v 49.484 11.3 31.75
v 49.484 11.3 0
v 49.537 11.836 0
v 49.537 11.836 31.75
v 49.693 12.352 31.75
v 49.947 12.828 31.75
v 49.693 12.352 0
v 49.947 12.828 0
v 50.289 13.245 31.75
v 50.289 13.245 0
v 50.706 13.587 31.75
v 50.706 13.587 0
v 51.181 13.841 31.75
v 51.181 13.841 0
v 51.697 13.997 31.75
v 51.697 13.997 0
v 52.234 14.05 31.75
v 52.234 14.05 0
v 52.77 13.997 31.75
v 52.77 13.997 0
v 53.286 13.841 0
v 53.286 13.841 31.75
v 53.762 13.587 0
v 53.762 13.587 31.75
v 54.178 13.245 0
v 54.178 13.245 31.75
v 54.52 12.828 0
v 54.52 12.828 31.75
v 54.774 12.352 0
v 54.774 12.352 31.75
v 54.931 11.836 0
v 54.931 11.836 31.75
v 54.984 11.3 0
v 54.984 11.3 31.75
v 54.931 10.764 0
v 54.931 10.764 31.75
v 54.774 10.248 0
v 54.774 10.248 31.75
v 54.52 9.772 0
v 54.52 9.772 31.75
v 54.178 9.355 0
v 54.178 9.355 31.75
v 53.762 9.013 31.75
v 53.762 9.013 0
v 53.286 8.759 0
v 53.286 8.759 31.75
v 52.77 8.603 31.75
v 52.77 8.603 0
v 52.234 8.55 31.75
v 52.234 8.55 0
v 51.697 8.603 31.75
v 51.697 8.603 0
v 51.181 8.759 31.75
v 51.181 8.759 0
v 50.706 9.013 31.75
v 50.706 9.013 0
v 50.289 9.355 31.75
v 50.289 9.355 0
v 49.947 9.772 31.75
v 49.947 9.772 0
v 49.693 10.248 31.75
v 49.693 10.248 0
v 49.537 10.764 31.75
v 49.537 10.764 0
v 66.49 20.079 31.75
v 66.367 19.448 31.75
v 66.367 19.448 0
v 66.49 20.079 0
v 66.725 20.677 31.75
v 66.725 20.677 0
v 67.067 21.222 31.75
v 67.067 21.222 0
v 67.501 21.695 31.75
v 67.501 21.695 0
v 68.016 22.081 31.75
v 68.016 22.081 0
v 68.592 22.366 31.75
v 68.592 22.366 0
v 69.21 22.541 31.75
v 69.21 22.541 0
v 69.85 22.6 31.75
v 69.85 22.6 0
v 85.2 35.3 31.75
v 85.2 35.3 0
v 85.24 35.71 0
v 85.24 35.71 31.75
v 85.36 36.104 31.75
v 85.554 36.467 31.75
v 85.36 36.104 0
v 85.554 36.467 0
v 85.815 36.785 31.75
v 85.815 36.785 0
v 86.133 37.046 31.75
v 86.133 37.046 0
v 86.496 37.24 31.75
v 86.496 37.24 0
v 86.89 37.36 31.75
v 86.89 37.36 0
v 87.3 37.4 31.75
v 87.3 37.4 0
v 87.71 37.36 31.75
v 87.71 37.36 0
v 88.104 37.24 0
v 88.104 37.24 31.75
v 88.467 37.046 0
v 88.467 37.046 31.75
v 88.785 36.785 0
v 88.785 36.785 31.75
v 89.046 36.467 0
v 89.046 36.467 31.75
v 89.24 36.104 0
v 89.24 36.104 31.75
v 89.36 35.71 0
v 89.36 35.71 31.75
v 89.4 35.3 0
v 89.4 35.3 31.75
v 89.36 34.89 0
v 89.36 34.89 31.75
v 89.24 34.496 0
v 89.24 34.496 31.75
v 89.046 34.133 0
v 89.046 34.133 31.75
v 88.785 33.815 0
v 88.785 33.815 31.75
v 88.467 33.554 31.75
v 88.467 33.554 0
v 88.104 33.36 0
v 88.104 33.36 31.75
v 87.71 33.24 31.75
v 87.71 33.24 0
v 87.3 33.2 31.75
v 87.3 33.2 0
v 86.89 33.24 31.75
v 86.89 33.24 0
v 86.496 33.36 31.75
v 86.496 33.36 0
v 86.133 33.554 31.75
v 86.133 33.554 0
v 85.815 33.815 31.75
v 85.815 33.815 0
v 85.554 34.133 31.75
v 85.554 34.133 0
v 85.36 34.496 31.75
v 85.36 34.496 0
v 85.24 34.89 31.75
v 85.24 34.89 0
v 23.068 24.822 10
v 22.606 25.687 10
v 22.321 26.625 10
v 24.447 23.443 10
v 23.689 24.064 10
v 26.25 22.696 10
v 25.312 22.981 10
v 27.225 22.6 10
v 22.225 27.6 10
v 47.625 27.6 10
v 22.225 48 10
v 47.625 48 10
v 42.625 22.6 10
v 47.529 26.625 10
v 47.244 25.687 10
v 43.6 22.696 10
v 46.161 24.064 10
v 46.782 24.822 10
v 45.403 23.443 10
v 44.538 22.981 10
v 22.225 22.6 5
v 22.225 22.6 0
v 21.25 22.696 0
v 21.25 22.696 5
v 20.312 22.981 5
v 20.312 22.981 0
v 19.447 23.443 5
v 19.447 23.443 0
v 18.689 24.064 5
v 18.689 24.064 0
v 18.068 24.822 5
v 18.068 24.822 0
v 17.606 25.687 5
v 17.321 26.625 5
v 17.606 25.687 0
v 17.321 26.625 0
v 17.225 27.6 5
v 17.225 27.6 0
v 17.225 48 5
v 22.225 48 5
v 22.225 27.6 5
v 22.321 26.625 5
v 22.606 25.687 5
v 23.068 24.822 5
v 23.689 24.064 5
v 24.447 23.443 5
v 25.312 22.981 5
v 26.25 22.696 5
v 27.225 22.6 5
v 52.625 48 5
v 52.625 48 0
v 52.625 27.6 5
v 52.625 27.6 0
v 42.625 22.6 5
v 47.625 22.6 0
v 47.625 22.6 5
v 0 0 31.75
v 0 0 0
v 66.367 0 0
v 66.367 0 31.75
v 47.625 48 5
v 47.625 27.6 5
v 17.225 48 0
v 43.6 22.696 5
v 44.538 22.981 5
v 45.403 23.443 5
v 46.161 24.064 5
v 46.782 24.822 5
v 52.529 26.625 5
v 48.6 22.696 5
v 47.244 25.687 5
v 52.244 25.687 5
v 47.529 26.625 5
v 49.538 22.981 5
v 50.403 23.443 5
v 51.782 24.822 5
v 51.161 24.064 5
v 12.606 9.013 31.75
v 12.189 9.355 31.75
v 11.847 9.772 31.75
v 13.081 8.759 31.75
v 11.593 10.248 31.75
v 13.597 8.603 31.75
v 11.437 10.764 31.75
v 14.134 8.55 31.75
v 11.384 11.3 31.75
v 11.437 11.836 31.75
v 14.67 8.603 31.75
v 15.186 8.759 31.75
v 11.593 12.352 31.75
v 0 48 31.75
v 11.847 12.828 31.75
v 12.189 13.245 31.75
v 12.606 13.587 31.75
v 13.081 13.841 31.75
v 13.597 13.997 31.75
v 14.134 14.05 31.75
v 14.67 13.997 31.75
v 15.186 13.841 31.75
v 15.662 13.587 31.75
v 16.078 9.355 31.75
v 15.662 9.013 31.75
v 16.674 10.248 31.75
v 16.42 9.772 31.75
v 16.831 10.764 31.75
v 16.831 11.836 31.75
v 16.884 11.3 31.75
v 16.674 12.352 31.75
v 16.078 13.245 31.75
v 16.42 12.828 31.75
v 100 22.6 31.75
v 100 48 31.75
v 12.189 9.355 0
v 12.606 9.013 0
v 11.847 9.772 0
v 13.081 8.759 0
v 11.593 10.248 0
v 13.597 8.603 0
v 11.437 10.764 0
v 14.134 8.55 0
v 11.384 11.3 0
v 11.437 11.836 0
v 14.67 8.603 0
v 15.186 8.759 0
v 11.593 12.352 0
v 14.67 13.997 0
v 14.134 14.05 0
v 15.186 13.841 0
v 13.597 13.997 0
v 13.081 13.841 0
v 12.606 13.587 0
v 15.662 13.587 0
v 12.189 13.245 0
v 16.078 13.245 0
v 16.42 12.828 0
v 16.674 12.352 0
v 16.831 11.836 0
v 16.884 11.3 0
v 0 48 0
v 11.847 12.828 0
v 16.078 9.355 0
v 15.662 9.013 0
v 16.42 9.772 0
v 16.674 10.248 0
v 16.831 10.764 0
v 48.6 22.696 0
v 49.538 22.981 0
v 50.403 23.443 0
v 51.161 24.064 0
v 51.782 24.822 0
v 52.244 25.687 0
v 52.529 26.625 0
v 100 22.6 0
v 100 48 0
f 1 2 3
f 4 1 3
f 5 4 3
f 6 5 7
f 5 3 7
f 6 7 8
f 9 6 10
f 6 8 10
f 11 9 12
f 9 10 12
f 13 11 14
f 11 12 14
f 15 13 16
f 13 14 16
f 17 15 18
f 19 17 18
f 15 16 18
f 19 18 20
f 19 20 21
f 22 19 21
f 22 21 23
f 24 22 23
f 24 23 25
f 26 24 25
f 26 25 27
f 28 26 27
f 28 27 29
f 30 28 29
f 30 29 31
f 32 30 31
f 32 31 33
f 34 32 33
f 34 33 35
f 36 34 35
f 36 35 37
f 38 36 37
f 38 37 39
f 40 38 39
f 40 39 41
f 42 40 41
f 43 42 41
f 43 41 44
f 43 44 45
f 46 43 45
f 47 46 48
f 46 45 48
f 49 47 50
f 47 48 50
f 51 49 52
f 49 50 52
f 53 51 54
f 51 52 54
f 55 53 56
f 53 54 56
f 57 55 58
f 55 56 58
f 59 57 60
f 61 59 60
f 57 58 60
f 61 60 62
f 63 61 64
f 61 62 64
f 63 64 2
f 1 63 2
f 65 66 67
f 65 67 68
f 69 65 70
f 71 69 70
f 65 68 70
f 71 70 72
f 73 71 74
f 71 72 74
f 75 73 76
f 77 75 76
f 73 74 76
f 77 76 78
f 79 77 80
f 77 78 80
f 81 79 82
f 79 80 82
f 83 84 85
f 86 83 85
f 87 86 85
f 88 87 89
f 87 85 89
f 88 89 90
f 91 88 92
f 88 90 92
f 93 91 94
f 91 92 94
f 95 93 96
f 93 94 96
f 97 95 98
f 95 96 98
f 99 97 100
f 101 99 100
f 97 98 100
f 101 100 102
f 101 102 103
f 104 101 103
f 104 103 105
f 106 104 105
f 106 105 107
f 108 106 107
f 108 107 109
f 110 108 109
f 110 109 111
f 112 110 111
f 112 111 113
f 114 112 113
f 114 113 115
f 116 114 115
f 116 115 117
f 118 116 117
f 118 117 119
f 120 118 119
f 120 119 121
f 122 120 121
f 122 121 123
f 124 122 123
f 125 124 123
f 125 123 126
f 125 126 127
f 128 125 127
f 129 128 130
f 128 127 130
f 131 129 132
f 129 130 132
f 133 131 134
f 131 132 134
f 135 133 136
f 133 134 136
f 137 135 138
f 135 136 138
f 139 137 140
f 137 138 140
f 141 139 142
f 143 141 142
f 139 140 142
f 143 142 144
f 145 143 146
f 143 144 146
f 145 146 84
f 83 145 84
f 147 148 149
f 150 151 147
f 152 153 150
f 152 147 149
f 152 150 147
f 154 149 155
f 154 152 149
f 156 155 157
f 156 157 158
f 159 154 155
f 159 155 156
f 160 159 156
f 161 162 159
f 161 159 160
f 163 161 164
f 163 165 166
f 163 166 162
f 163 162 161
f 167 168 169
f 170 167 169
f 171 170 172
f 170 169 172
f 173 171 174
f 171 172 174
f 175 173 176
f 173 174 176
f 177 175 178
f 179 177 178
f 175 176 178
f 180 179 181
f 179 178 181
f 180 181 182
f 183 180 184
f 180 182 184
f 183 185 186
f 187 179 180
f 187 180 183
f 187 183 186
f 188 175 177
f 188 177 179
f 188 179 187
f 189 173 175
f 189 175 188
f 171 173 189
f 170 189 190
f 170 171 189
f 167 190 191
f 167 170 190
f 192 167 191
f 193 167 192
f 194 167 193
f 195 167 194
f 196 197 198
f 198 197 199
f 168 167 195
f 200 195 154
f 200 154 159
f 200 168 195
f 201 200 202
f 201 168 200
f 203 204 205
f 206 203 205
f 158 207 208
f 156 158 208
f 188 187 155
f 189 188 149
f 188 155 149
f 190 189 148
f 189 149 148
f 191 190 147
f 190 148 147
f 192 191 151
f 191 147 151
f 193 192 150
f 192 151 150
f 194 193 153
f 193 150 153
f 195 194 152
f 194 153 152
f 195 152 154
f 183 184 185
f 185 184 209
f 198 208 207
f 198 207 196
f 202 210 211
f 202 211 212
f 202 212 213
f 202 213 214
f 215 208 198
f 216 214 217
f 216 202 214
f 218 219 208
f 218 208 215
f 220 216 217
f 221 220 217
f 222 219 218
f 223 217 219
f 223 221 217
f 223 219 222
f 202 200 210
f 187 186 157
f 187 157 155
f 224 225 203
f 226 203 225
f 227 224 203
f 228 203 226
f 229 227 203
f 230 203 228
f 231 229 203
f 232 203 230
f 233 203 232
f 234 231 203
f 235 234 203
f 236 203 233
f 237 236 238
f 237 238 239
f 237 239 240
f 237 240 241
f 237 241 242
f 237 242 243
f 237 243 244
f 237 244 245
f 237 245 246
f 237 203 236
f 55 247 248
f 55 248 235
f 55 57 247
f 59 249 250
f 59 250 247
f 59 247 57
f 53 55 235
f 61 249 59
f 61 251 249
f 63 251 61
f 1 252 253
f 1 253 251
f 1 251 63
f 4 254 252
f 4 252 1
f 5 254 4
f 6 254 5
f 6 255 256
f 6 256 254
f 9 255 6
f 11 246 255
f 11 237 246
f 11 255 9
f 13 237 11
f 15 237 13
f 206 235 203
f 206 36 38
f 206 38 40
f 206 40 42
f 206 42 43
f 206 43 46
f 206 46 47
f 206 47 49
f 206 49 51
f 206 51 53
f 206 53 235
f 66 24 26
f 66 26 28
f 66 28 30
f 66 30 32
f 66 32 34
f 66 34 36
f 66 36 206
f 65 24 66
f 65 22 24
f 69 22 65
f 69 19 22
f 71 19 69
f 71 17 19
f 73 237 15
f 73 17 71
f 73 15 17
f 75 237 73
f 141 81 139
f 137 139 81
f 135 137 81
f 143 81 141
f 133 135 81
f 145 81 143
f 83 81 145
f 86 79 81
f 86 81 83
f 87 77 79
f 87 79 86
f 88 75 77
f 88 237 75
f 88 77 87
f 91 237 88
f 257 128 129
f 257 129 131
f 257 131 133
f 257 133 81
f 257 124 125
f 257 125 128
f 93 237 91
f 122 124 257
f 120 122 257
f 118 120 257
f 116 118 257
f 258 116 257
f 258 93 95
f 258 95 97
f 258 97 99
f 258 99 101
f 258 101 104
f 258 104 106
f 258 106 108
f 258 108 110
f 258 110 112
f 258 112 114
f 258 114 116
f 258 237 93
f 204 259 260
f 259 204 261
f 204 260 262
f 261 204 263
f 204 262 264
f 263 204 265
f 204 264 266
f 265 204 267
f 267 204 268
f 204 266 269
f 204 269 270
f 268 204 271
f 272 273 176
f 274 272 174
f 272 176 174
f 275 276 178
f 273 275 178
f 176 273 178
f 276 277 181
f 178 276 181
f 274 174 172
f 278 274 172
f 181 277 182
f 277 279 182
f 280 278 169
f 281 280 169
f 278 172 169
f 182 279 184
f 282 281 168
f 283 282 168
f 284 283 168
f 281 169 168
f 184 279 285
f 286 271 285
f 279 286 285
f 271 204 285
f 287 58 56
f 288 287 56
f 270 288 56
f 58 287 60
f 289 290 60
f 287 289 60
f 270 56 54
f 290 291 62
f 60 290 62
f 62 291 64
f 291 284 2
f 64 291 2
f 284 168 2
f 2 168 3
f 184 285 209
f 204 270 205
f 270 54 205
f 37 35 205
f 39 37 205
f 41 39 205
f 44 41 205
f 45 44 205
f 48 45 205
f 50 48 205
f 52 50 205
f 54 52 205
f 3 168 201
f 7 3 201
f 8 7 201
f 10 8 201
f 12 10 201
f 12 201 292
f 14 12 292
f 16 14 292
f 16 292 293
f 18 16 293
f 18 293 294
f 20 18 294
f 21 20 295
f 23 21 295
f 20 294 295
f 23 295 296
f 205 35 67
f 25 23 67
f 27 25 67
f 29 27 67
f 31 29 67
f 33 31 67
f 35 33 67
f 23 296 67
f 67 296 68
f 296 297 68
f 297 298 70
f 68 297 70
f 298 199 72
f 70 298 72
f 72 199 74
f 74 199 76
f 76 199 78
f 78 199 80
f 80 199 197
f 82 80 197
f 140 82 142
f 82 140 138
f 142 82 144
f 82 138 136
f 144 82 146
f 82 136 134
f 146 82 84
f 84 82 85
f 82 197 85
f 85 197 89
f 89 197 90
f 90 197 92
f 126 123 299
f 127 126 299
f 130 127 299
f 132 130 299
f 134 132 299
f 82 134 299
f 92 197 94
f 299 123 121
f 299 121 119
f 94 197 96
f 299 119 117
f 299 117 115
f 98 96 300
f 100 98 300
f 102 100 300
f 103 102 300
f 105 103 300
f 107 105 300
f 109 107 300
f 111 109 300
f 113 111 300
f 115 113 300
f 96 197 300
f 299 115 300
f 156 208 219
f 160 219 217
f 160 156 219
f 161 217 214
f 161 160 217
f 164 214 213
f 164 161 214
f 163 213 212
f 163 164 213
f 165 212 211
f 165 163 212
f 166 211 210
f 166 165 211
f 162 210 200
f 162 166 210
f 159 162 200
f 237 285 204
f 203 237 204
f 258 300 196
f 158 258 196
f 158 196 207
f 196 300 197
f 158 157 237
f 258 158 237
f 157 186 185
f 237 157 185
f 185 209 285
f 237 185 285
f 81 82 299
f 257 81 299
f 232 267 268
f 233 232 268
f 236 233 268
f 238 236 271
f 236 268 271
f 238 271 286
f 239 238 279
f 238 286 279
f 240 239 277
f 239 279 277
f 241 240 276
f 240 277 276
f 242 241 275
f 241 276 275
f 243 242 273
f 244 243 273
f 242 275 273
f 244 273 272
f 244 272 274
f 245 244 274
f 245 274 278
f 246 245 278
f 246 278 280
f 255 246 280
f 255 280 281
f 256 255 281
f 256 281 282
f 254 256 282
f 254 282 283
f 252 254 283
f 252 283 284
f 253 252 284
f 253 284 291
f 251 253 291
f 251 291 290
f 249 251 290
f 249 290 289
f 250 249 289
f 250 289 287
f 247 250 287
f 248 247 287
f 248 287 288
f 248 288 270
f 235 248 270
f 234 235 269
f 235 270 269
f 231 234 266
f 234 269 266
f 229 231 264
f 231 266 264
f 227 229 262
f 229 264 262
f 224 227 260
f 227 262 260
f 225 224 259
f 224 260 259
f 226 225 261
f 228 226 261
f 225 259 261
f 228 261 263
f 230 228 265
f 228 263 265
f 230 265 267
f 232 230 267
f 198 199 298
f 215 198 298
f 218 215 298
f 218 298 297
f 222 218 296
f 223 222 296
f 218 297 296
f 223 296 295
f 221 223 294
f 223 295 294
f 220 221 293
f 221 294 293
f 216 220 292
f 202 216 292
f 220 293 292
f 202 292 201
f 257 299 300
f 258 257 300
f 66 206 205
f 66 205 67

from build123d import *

# Parameters (mm, degrees)
F1_DEPTH  = 31.75
F2_W      = 25.4
F2_H      = 25.4
F3_DEPTH  = 10
F4_R      = 5
F6_D      = 5.5
F8_D      = 4.2
F11_DEPTH = 5


with BuildPart() as f1:
    # F0 (on Top) → F1 (new body)
    with BuildSketch(Plane.XY):
        with BuildLine():
            Line((0, 48), (0, 0))
            Line((0, 0), (66.3673695676, 0))
            Line((66.3673695676, 0), (66.3673695676, 19.4482603496))
            ThreePointArc((66.3673695676, 19.4482603496), (67.5014803837, 21.6950829682), (69.85, 22.6))
            Line((69.85, 22.6), (100, 22.6))
            Line((100, 22.6), (100, 48))
            Line((100, 48), (0, 48))
        make_face()
    extrude(amount=F1_DEPTH)

    # F2 (on face) → F3 (cut)
    with BuildSketch(Plane(origin=(0, 0, 0), x_dir=(1, 0, 0), z_dir=(0, 0, -1))):
        with Locations((34.925, -35.3)):
            Rectangle(F2_W, F2_H)
    extrude(amount=-F3_DEPTH, mode=Mode.SUBTRACT)

    # F4
    f4_edges = [f1.edges().sort_by_distance(p)[0] for p in [
        (22.225, 22.6, 5),
        (47.625, 22.6, 5),
    ]]
    fillet(f4_edges, radius=F4_R)

    # F6 (through all)
    with Locations(Plane.XY.offset(31.75)):
        with Locations((14.1336847838, 11.3), (52.2336847838, 11.3)):
            Hole(F6_D / 2)

    # F8 (through all)
    with Locations(Plane.XY.offset(31.75)):
        with Locations((87.3, 35.3)):
            Hole(F8_D / 2)

    # F10 (on face) → F11 (cut)
    with BuildSketch(Plane(origin=(0, 0, 0), x_dir=(1, 0, 0), z_dir=(0, 0, -1))):
        with BuildLine():
            Line((17.225, -27.6), (17.225, -48))
            Line((17.225, -48), (52.625, -48))
            Line((52.625, -48), (52.625, -27.6))
            ThreePointArc((52.625, -27.6), (51.1605339059, -24.0644660941), (47.625, -22.6))
            Line((47.625, -22.6), (22.225, -22.6))
            ThreePointArc((22.225, -22.6), (18.6894660941, -24.0644660941), (17.225, -27.6))
        make_face()
    extrude(amount=-F11_DEPTH, mode=Mode.SUBTRACT)


solid = f1.part
